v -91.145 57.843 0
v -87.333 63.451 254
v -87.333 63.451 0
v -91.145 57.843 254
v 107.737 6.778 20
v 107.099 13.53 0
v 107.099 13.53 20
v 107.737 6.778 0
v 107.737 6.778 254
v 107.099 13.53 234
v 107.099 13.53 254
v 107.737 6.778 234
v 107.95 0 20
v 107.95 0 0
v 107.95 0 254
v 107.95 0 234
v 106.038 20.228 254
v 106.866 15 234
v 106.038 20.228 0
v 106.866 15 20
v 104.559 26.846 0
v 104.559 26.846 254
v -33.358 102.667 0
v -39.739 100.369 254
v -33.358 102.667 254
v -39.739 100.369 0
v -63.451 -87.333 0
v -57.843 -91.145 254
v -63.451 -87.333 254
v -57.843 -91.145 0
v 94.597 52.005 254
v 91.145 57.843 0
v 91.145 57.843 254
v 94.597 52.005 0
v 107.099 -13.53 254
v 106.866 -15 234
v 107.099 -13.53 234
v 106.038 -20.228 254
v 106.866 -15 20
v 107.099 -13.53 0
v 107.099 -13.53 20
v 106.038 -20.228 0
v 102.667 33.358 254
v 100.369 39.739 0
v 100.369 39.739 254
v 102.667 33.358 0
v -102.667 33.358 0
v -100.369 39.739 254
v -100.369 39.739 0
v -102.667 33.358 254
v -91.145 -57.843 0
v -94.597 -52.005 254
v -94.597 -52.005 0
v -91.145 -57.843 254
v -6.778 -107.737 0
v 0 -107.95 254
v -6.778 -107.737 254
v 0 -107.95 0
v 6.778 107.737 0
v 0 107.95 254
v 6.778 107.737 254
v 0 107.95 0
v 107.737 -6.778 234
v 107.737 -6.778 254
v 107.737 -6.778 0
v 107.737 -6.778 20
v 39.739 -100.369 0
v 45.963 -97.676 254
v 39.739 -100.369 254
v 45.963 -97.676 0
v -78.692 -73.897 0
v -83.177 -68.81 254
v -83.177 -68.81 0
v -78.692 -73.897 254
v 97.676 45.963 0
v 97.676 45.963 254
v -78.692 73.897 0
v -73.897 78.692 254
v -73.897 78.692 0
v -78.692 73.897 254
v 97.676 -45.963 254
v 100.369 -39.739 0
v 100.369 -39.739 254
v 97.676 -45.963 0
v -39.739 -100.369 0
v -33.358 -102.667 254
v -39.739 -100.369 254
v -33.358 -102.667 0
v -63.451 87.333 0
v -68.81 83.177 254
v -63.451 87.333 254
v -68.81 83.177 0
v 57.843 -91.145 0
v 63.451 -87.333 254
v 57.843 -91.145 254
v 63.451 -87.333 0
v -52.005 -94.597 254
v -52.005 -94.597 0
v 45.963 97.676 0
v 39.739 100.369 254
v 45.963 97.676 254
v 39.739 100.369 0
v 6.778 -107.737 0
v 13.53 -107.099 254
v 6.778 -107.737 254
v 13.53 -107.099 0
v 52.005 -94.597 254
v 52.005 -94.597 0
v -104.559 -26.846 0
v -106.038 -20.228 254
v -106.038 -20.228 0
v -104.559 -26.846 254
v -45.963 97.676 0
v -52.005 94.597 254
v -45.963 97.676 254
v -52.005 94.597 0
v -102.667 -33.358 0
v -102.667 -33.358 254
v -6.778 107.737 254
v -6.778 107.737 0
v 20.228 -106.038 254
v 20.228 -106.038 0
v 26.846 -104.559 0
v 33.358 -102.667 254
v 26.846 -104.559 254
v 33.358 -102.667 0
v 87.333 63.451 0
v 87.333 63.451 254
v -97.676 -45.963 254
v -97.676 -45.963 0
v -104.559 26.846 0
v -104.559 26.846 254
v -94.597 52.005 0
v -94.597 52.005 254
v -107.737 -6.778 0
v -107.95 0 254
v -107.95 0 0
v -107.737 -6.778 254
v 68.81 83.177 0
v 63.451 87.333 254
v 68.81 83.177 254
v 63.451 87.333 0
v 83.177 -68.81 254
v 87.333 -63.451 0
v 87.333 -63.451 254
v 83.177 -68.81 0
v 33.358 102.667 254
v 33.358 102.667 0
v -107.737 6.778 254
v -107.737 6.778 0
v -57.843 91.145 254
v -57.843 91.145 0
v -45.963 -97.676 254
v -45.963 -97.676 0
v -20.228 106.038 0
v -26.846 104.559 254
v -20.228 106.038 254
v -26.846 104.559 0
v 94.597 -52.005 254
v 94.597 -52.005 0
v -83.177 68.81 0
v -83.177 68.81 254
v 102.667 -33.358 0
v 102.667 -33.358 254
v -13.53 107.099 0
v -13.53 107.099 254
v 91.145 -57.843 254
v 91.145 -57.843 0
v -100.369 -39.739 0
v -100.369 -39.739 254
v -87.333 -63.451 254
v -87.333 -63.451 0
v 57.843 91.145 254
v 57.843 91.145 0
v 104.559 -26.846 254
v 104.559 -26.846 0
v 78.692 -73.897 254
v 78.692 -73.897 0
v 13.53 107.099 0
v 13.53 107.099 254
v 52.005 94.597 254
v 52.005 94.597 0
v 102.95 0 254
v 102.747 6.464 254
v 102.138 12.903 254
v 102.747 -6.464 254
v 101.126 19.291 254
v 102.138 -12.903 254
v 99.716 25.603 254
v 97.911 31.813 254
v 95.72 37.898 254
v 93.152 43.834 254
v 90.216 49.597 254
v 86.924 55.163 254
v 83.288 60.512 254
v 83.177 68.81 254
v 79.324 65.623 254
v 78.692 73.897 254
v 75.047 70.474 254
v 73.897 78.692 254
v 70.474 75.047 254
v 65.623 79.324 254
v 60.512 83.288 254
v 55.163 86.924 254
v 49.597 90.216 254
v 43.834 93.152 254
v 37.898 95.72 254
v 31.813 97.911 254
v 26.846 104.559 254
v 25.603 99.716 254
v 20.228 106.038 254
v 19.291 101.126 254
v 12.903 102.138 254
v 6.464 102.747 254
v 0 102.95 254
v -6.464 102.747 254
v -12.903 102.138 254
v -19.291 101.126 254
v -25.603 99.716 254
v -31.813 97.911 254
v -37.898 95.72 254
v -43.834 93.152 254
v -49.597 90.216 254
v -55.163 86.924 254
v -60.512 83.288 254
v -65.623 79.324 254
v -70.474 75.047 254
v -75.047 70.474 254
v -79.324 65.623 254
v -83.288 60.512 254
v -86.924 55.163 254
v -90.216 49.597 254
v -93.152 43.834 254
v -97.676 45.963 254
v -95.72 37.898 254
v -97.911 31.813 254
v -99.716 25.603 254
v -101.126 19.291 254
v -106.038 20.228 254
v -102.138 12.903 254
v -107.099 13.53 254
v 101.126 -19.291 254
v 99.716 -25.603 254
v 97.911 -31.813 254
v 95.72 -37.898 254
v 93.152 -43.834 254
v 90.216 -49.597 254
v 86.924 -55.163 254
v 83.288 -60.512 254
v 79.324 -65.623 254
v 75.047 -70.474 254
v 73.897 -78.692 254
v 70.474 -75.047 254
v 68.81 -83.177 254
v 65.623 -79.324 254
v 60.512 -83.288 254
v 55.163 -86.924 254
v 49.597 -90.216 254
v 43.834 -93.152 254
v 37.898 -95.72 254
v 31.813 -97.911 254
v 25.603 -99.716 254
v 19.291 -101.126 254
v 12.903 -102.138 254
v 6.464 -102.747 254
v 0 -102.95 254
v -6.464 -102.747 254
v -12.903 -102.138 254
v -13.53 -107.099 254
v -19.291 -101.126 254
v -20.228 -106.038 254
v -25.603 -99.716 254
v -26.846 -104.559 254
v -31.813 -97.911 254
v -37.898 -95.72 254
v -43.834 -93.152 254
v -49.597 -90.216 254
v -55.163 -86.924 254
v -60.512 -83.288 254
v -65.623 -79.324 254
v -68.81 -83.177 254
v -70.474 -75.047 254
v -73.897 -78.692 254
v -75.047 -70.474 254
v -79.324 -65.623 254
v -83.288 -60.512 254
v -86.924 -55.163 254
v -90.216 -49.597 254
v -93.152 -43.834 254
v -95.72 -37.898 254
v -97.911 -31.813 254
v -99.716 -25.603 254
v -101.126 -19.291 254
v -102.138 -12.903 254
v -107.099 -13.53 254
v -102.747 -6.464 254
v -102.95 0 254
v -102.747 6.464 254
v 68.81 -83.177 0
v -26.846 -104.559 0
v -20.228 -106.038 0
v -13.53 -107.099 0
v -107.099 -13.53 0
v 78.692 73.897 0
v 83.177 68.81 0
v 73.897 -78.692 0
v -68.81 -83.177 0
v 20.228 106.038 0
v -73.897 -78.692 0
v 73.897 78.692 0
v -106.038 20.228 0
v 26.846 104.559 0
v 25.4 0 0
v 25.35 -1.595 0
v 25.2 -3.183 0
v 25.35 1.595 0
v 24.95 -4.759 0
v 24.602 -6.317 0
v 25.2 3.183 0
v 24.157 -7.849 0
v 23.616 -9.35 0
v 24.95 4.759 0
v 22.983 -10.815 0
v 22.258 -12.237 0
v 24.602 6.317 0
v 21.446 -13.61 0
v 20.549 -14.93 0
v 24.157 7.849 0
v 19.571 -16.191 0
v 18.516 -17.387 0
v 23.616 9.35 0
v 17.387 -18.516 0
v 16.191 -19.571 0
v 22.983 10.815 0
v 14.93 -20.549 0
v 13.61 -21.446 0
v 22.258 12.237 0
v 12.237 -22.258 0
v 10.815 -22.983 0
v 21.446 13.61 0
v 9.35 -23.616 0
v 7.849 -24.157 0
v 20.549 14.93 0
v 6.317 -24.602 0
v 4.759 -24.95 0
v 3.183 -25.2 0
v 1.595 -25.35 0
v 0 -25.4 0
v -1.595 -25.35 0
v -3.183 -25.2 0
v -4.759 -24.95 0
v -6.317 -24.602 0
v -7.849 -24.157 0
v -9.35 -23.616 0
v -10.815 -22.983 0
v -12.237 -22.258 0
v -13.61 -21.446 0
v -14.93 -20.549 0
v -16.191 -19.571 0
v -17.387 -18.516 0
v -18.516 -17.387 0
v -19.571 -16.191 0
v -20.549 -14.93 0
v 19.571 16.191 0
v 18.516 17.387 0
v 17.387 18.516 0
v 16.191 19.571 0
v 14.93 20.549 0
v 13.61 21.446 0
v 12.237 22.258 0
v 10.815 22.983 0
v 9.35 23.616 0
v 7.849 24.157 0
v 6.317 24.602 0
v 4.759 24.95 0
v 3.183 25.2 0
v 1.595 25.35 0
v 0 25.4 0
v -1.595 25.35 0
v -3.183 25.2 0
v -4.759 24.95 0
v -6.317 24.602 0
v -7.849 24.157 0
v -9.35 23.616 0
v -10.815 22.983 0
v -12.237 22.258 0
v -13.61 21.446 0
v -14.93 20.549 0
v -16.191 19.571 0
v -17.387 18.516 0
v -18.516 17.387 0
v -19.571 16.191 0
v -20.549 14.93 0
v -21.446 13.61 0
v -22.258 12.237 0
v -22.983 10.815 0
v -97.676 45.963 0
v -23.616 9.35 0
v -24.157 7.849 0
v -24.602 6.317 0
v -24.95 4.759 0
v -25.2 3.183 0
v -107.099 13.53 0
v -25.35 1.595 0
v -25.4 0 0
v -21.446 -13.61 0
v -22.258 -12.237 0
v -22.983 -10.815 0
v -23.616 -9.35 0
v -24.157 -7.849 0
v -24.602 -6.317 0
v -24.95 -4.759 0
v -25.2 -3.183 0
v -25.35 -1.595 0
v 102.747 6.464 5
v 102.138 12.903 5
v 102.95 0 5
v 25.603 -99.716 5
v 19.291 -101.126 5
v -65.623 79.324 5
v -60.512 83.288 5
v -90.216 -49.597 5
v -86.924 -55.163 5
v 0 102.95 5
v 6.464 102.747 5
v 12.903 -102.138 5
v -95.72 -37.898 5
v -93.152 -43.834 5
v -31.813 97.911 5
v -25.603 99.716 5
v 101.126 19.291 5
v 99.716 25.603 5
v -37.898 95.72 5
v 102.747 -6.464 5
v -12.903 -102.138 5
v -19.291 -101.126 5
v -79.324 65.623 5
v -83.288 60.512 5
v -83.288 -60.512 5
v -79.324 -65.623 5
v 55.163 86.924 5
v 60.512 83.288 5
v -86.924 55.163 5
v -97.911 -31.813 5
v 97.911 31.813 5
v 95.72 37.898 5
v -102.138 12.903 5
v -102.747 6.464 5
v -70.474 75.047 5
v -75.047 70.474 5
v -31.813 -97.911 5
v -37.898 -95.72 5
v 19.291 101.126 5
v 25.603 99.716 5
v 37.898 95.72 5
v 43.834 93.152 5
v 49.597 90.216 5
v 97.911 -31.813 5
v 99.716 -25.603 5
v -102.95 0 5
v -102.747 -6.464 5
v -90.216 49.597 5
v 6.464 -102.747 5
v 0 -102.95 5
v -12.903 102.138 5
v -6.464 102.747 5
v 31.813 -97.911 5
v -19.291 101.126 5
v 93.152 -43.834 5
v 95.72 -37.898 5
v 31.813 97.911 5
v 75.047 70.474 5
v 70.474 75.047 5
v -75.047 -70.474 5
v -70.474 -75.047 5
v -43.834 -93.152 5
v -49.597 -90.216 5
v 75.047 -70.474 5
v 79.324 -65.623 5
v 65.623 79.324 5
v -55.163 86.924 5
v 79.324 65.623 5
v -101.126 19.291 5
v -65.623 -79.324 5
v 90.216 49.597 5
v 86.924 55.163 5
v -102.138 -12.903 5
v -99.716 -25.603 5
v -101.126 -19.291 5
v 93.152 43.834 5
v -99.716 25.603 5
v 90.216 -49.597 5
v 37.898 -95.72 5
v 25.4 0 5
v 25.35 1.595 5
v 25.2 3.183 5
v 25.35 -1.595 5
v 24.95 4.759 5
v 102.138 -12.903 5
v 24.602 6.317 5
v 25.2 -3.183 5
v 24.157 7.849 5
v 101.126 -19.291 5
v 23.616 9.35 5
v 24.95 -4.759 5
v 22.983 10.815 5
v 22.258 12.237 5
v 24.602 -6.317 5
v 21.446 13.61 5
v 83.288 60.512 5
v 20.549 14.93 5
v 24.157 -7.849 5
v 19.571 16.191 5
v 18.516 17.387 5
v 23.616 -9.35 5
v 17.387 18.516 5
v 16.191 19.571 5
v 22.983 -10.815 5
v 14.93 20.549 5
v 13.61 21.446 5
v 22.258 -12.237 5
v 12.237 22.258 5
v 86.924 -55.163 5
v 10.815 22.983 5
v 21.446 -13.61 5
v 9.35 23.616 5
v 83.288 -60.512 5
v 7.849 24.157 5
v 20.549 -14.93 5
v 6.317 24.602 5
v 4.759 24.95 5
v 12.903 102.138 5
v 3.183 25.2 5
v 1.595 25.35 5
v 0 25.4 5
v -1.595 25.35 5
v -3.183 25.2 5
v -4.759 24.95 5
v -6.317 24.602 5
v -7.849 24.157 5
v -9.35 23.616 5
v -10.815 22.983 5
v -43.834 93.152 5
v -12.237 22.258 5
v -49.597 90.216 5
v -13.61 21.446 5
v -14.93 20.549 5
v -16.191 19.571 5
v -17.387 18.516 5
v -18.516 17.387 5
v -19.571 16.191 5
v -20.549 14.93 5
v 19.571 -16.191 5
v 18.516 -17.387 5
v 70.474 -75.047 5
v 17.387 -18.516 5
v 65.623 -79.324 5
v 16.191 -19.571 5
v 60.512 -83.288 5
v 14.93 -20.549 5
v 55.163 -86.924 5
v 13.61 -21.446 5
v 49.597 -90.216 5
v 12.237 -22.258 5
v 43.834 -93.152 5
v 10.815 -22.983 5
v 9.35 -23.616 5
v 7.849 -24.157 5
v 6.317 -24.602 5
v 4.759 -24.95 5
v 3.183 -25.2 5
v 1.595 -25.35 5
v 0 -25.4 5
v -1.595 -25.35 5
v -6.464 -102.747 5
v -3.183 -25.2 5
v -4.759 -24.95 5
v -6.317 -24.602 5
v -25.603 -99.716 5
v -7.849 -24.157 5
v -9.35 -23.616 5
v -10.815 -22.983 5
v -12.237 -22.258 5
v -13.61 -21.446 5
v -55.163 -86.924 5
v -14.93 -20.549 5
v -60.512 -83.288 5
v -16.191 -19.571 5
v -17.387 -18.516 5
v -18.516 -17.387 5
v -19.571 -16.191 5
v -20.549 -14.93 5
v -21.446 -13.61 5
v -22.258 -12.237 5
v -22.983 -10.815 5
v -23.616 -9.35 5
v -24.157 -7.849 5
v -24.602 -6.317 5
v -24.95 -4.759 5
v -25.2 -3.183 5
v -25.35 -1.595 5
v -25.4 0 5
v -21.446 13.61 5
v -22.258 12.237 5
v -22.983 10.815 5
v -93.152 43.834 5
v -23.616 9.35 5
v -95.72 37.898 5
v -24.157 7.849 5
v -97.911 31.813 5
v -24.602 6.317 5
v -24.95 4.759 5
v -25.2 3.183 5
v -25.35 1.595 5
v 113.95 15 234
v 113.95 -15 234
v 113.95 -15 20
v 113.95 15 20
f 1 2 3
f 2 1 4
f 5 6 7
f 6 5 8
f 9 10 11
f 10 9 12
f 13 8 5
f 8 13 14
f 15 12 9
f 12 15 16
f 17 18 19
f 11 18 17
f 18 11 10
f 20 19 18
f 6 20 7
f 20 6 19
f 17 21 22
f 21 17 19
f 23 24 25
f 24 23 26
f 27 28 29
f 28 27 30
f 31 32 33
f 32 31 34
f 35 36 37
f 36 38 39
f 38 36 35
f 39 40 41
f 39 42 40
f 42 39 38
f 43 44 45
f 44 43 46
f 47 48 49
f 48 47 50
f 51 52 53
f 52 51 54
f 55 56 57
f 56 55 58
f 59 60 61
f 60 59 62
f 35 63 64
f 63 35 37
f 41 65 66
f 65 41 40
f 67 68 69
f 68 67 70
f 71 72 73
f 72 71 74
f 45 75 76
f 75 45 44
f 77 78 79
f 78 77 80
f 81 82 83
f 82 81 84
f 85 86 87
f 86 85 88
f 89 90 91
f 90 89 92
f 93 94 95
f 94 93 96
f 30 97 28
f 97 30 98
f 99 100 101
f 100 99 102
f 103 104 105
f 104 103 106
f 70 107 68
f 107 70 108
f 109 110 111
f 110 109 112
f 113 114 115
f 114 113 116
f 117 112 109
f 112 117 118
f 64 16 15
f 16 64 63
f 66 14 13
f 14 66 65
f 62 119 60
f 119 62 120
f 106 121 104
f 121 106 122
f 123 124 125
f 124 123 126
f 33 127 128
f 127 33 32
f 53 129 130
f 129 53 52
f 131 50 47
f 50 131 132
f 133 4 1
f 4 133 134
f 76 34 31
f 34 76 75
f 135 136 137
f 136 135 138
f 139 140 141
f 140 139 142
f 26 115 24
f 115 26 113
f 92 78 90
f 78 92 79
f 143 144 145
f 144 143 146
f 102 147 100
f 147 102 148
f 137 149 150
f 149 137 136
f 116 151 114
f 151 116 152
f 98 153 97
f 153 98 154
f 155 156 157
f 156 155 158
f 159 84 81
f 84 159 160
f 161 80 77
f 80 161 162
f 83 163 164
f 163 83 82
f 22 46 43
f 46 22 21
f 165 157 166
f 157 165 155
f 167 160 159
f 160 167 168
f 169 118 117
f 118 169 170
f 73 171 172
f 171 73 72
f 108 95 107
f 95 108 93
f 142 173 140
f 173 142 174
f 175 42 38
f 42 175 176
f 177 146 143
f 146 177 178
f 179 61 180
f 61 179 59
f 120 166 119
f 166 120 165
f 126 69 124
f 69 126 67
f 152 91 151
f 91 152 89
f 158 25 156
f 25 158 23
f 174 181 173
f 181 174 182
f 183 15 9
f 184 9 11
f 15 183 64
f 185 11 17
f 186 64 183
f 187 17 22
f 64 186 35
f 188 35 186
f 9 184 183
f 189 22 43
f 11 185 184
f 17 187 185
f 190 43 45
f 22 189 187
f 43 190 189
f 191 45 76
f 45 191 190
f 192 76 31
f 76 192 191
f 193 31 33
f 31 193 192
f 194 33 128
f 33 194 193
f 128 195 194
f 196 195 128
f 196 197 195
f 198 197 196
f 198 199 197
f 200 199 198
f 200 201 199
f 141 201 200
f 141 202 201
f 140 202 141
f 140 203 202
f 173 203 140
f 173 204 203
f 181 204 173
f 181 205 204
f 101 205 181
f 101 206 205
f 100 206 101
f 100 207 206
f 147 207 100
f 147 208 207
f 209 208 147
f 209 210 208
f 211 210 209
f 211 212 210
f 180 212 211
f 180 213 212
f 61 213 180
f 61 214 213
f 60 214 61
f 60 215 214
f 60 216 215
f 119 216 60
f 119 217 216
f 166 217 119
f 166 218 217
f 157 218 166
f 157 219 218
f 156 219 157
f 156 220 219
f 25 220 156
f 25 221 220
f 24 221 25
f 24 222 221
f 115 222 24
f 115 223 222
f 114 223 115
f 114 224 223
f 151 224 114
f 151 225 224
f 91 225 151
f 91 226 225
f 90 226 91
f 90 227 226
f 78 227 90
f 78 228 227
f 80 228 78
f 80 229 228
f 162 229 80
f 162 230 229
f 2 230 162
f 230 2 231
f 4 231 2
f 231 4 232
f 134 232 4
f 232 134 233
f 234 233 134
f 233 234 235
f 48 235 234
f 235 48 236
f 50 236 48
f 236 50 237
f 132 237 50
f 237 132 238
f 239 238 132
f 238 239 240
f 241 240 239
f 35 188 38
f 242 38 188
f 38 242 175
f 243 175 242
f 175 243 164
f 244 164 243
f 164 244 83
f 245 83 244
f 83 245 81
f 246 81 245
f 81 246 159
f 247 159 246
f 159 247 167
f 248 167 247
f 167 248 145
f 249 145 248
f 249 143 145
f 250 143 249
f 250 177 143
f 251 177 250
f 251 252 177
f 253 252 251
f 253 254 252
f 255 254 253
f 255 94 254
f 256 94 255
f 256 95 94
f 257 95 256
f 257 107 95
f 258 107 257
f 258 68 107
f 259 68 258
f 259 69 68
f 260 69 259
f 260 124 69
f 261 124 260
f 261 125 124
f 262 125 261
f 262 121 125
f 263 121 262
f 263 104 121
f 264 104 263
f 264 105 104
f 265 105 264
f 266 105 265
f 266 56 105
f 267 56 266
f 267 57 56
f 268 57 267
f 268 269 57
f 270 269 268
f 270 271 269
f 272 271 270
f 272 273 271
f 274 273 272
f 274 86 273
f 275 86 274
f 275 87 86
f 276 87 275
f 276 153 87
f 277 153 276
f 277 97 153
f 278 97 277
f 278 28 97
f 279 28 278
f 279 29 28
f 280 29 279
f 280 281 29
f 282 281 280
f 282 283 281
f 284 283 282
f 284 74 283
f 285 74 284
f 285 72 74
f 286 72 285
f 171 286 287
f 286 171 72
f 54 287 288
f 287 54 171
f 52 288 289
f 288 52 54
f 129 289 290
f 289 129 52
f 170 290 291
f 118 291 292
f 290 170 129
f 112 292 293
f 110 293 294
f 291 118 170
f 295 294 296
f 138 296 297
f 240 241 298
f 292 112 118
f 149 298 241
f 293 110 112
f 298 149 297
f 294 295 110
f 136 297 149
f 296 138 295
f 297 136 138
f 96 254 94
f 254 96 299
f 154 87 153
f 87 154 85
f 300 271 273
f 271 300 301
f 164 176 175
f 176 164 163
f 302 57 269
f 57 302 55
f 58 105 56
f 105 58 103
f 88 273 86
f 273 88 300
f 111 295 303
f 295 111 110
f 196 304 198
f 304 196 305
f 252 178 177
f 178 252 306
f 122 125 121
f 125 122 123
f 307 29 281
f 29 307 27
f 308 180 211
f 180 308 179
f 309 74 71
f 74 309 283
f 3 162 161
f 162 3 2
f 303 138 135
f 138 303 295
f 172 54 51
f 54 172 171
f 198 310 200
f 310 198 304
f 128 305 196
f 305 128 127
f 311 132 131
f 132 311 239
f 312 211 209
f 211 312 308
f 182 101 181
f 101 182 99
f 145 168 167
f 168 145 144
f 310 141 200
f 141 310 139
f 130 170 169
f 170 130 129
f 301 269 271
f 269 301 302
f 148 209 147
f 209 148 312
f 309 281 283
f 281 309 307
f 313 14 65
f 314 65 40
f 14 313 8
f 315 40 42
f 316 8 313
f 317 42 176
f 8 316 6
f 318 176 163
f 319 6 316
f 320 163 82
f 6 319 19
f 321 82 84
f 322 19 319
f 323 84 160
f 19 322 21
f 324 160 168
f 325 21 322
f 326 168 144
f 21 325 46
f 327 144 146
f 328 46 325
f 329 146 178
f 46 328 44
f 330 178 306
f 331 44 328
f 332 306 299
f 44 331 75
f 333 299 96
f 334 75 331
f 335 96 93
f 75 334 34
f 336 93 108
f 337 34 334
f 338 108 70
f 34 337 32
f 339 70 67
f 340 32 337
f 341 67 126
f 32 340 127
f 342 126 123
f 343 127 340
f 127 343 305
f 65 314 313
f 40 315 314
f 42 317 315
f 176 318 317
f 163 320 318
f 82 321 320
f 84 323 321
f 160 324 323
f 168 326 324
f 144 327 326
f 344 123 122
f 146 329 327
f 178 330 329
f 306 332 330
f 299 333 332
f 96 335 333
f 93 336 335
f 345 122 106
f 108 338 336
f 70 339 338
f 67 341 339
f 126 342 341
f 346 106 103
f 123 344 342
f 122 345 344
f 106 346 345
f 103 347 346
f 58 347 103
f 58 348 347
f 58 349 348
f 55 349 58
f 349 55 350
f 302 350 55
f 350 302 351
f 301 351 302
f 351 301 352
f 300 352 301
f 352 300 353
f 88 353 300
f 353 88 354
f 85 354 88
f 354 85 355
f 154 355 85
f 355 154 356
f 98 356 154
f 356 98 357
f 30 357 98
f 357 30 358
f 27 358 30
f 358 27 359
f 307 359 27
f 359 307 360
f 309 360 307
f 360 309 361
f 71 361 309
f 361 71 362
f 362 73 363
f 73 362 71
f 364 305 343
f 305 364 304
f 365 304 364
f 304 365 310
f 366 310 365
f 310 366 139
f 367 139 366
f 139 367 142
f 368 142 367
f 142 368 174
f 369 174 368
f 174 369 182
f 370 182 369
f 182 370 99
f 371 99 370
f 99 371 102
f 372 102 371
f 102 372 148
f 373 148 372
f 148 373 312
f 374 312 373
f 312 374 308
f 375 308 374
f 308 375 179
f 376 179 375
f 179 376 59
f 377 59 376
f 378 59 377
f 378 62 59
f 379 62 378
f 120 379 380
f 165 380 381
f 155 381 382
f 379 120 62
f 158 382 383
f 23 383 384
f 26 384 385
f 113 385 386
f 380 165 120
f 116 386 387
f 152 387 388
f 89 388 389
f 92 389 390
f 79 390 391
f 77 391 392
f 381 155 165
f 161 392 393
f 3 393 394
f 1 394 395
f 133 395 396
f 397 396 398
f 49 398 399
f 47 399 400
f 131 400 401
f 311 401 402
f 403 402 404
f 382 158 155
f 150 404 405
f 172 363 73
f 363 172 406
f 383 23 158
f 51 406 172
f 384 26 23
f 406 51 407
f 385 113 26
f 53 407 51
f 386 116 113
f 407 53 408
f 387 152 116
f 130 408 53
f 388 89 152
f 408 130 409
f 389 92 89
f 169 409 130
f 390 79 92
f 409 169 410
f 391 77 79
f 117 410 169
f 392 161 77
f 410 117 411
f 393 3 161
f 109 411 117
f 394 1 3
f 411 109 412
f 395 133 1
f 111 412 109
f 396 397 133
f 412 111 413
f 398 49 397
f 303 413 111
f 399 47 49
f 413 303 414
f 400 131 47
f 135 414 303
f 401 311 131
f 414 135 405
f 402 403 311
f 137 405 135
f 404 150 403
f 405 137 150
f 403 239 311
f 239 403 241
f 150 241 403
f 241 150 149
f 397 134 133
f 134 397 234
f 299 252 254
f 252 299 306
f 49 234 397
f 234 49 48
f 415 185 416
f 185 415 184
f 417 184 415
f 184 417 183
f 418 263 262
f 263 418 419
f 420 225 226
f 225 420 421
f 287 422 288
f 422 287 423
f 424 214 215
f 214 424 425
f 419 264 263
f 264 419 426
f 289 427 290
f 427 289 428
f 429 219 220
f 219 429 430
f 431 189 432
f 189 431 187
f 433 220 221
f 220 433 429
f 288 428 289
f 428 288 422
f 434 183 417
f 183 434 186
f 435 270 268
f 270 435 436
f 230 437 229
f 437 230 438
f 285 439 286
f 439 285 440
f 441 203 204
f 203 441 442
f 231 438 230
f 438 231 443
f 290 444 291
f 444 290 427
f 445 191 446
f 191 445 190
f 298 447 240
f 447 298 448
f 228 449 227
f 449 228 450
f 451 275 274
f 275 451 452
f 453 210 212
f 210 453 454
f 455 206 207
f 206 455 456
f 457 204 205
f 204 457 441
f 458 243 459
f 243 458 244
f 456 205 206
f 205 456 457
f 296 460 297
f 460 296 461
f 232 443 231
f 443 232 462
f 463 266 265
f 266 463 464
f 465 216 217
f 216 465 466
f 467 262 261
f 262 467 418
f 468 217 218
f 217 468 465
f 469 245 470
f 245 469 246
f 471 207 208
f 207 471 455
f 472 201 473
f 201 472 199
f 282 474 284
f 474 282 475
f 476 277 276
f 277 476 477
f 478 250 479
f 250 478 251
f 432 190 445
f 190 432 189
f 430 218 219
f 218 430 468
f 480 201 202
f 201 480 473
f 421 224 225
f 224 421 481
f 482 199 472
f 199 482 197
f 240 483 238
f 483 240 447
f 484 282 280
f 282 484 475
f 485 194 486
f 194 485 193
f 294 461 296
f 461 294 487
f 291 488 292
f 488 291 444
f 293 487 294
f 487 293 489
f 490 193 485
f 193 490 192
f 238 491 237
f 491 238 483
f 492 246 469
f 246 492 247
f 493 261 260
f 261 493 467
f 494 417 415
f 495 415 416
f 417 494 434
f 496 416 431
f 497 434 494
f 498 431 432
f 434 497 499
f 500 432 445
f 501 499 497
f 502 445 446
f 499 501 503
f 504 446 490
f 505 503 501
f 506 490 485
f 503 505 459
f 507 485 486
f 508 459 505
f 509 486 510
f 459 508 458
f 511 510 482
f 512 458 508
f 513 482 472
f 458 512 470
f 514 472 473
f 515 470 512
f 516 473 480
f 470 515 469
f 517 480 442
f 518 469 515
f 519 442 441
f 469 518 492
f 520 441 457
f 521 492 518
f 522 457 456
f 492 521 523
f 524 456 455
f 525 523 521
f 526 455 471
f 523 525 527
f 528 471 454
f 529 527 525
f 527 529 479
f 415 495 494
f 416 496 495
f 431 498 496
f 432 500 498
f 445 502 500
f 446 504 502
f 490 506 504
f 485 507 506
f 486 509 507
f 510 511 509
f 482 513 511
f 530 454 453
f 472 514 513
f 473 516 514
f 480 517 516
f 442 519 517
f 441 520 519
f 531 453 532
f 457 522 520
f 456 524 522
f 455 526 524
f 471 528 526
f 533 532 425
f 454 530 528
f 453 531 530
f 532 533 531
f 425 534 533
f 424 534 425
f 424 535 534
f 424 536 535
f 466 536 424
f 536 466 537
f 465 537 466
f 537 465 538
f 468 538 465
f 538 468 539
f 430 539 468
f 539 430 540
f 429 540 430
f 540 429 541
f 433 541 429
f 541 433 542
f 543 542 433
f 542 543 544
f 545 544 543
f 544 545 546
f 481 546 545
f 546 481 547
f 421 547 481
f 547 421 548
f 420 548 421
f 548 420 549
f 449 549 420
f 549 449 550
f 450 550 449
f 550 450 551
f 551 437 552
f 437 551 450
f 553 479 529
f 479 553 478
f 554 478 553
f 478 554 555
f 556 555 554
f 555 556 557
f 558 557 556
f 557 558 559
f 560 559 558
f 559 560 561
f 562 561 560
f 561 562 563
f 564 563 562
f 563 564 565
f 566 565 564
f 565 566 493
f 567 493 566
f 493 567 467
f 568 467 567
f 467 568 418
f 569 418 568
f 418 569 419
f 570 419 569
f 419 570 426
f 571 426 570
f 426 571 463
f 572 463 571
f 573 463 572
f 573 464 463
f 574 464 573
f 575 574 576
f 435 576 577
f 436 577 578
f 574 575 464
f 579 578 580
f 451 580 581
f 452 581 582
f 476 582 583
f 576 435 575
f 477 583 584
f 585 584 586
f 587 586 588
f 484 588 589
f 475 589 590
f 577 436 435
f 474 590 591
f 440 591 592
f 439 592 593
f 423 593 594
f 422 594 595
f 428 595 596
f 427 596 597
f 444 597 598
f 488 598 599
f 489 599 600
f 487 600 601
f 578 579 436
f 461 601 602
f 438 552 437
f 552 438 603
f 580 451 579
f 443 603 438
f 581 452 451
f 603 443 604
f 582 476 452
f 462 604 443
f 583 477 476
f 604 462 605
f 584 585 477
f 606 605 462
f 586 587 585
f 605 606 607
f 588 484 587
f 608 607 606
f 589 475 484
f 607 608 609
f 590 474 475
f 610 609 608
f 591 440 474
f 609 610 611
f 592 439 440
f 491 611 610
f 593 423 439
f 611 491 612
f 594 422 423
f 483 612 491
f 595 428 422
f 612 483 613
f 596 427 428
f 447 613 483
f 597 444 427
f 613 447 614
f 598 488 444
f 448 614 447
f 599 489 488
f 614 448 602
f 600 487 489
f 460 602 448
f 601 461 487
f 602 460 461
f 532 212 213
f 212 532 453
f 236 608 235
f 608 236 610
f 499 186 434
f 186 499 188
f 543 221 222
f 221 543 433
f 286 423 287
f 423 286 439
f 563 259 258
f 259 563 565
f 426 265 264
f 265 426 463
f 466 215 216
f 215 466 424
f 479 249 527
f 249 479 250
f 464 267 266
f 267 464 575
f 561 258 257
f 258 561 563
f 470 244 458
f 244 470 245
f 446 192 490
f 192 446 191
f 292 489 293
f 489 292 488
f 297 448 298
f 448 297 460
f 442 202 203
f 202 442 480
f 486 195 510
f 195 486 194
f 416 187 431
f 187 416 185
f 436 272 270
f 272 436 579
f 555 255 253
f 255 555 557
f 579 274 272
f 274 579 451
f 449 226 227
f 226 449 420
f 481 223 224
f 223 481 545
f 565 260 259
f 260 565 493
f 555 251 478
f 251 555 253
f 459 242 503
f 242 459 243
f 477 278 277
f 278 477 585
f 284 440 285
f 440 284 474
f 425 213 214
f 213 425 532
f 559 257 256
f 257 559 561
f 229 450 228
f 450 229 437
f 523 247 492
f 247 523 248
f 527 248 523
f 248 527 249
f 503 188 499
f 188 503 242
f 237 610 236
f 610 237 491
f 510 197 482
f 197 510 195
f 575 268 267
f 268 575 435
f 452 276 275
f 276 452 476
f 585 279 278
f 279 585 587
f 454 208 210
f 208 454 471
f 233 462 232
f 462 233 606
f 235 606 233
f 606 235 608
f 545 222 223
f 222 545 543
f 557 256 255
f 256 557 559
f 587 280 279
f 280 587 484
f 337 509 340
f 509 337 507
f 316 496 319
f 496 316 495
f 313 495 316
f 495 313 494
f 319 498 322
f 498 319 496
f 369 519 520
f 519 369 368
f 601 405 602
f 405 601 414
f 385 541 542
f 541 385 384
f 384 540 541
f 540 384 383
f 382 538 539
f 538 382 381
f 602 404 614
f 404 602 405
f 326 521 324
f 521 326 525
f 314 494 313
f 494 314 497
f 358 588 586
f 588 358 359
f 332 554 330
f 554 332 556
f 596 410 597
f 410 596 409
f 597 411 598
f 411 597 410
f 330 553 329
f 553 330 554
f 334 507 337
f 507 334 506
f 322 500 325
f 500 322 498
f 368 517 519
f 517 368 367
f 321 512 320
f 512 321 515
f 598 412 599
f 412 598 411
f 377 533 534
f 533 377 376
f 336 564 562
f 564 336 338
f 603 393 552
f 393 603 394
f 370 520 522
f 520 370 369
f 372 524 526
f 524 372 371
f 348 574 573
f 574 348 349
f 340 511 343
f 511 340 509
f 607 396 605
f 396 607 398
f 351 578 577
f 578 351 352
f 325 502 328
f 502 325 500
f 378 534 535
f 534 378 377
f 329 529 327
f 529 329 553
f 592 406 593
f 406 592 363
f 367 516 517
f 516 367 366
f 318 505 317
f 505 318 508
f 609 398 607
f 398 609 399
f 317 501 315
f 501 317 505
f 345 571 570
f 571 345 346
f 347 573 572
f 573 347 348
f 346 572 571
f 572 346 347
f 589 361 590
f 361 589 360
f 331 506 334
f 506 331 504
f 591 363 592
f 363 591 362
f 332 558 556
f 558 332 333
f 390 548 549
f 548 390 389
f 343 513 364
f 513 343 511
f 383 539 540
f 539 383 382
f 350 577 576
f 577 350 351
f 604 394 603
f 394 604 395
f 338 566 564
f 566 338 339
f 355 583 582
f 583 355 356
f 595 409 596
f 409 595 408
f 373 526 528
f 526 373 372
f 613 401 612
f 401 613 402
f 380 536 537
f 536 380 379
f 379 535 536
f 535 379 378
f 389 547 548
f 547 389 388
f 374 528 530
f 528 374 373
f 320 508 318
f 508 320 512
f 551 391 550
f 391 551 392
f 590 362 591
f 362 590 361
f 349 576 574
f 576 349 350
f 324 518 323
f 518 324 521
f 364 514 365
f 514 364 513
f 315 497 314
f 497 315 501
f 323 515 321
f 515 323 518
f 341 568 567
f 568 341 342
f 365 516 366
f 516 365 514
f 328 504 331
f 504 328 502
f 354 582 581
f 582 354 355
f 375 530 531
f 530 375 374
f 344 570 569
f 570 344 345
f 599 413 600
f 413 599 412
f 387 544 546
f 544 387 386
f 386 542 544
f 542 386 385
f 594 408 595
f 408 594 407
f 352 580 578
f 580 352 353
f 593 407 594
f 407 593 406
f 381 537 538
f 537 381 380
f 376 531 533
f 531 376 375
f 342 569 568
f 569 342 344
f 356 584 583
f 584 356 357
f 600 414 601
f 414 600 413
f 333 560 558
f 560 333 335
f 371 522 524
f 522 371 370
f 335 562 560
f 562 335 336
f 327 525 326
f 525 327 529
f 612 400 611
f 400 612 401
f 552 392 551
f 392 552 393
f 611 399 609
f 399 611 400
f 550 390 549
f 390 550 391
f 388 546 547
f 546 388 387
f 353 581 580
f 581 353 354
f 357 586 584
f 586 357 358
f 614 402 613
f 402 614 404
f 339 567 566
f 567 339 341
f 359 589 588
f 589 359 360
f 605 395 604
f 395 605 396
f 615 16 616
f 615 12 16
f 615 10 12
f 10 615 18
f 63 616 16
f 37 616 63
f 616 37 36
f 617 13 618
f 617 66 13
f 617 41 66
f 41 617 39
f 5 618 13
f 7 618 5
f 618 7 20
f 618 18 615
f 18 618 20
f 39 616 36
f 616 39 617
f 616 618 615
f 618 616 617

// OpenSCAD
// STORMSTOPPER LGM-15 Housing Canister
// Dimensions: 8.5" Outer Diameter, 10" Total Depth
// Designed by Emerald City Techs for FOX5 Vegas Computing Core

$fn = 100; // Smooth fragments for geometric calculation

// Unit Conversion Factors
in_to_mm = 25.4;
outer_dia = 8.5 * in_to_mm;
total_depth = 10.0 * in_to_mm;
wall_thickness = 5; // Structural wall envelope in mm

module stormstopper_canister() {
    difference() {
        // Main Physical Outer Cylinder
        cylinder(h = total_depth, d = outer_dia, center = false);
        
        // Internal Cavity for LGM-15 Core Assembly
        translate([0, 0, wall_thickness]) {
            cylinder(h = total_depth, d = outer_dia - (2 * wall_thickness), center = false);
        }
        
        // Base Port for Blind-Mate Telemetry Connector Interface
        translate([0, 0, -1]) {
            cylinder(h = wall_thickness + 2, d = 2.0 * in_to_mm, center = false);
        }
    }
    
    // Integrated Mounting Shoe for External Launch Rails
    translate([(outer_dia / 2) - 2, -15, 20]) {
        difference() {
            cube([20, 30, total_depth - 40]);
            
            // Negative space cut for T-Slot rail slide engagement
            translate([8, -1, -1]) {
                cube([14, 32, total_depth - 38]);
            }
        }
    }
}

stormstopper_canister();
